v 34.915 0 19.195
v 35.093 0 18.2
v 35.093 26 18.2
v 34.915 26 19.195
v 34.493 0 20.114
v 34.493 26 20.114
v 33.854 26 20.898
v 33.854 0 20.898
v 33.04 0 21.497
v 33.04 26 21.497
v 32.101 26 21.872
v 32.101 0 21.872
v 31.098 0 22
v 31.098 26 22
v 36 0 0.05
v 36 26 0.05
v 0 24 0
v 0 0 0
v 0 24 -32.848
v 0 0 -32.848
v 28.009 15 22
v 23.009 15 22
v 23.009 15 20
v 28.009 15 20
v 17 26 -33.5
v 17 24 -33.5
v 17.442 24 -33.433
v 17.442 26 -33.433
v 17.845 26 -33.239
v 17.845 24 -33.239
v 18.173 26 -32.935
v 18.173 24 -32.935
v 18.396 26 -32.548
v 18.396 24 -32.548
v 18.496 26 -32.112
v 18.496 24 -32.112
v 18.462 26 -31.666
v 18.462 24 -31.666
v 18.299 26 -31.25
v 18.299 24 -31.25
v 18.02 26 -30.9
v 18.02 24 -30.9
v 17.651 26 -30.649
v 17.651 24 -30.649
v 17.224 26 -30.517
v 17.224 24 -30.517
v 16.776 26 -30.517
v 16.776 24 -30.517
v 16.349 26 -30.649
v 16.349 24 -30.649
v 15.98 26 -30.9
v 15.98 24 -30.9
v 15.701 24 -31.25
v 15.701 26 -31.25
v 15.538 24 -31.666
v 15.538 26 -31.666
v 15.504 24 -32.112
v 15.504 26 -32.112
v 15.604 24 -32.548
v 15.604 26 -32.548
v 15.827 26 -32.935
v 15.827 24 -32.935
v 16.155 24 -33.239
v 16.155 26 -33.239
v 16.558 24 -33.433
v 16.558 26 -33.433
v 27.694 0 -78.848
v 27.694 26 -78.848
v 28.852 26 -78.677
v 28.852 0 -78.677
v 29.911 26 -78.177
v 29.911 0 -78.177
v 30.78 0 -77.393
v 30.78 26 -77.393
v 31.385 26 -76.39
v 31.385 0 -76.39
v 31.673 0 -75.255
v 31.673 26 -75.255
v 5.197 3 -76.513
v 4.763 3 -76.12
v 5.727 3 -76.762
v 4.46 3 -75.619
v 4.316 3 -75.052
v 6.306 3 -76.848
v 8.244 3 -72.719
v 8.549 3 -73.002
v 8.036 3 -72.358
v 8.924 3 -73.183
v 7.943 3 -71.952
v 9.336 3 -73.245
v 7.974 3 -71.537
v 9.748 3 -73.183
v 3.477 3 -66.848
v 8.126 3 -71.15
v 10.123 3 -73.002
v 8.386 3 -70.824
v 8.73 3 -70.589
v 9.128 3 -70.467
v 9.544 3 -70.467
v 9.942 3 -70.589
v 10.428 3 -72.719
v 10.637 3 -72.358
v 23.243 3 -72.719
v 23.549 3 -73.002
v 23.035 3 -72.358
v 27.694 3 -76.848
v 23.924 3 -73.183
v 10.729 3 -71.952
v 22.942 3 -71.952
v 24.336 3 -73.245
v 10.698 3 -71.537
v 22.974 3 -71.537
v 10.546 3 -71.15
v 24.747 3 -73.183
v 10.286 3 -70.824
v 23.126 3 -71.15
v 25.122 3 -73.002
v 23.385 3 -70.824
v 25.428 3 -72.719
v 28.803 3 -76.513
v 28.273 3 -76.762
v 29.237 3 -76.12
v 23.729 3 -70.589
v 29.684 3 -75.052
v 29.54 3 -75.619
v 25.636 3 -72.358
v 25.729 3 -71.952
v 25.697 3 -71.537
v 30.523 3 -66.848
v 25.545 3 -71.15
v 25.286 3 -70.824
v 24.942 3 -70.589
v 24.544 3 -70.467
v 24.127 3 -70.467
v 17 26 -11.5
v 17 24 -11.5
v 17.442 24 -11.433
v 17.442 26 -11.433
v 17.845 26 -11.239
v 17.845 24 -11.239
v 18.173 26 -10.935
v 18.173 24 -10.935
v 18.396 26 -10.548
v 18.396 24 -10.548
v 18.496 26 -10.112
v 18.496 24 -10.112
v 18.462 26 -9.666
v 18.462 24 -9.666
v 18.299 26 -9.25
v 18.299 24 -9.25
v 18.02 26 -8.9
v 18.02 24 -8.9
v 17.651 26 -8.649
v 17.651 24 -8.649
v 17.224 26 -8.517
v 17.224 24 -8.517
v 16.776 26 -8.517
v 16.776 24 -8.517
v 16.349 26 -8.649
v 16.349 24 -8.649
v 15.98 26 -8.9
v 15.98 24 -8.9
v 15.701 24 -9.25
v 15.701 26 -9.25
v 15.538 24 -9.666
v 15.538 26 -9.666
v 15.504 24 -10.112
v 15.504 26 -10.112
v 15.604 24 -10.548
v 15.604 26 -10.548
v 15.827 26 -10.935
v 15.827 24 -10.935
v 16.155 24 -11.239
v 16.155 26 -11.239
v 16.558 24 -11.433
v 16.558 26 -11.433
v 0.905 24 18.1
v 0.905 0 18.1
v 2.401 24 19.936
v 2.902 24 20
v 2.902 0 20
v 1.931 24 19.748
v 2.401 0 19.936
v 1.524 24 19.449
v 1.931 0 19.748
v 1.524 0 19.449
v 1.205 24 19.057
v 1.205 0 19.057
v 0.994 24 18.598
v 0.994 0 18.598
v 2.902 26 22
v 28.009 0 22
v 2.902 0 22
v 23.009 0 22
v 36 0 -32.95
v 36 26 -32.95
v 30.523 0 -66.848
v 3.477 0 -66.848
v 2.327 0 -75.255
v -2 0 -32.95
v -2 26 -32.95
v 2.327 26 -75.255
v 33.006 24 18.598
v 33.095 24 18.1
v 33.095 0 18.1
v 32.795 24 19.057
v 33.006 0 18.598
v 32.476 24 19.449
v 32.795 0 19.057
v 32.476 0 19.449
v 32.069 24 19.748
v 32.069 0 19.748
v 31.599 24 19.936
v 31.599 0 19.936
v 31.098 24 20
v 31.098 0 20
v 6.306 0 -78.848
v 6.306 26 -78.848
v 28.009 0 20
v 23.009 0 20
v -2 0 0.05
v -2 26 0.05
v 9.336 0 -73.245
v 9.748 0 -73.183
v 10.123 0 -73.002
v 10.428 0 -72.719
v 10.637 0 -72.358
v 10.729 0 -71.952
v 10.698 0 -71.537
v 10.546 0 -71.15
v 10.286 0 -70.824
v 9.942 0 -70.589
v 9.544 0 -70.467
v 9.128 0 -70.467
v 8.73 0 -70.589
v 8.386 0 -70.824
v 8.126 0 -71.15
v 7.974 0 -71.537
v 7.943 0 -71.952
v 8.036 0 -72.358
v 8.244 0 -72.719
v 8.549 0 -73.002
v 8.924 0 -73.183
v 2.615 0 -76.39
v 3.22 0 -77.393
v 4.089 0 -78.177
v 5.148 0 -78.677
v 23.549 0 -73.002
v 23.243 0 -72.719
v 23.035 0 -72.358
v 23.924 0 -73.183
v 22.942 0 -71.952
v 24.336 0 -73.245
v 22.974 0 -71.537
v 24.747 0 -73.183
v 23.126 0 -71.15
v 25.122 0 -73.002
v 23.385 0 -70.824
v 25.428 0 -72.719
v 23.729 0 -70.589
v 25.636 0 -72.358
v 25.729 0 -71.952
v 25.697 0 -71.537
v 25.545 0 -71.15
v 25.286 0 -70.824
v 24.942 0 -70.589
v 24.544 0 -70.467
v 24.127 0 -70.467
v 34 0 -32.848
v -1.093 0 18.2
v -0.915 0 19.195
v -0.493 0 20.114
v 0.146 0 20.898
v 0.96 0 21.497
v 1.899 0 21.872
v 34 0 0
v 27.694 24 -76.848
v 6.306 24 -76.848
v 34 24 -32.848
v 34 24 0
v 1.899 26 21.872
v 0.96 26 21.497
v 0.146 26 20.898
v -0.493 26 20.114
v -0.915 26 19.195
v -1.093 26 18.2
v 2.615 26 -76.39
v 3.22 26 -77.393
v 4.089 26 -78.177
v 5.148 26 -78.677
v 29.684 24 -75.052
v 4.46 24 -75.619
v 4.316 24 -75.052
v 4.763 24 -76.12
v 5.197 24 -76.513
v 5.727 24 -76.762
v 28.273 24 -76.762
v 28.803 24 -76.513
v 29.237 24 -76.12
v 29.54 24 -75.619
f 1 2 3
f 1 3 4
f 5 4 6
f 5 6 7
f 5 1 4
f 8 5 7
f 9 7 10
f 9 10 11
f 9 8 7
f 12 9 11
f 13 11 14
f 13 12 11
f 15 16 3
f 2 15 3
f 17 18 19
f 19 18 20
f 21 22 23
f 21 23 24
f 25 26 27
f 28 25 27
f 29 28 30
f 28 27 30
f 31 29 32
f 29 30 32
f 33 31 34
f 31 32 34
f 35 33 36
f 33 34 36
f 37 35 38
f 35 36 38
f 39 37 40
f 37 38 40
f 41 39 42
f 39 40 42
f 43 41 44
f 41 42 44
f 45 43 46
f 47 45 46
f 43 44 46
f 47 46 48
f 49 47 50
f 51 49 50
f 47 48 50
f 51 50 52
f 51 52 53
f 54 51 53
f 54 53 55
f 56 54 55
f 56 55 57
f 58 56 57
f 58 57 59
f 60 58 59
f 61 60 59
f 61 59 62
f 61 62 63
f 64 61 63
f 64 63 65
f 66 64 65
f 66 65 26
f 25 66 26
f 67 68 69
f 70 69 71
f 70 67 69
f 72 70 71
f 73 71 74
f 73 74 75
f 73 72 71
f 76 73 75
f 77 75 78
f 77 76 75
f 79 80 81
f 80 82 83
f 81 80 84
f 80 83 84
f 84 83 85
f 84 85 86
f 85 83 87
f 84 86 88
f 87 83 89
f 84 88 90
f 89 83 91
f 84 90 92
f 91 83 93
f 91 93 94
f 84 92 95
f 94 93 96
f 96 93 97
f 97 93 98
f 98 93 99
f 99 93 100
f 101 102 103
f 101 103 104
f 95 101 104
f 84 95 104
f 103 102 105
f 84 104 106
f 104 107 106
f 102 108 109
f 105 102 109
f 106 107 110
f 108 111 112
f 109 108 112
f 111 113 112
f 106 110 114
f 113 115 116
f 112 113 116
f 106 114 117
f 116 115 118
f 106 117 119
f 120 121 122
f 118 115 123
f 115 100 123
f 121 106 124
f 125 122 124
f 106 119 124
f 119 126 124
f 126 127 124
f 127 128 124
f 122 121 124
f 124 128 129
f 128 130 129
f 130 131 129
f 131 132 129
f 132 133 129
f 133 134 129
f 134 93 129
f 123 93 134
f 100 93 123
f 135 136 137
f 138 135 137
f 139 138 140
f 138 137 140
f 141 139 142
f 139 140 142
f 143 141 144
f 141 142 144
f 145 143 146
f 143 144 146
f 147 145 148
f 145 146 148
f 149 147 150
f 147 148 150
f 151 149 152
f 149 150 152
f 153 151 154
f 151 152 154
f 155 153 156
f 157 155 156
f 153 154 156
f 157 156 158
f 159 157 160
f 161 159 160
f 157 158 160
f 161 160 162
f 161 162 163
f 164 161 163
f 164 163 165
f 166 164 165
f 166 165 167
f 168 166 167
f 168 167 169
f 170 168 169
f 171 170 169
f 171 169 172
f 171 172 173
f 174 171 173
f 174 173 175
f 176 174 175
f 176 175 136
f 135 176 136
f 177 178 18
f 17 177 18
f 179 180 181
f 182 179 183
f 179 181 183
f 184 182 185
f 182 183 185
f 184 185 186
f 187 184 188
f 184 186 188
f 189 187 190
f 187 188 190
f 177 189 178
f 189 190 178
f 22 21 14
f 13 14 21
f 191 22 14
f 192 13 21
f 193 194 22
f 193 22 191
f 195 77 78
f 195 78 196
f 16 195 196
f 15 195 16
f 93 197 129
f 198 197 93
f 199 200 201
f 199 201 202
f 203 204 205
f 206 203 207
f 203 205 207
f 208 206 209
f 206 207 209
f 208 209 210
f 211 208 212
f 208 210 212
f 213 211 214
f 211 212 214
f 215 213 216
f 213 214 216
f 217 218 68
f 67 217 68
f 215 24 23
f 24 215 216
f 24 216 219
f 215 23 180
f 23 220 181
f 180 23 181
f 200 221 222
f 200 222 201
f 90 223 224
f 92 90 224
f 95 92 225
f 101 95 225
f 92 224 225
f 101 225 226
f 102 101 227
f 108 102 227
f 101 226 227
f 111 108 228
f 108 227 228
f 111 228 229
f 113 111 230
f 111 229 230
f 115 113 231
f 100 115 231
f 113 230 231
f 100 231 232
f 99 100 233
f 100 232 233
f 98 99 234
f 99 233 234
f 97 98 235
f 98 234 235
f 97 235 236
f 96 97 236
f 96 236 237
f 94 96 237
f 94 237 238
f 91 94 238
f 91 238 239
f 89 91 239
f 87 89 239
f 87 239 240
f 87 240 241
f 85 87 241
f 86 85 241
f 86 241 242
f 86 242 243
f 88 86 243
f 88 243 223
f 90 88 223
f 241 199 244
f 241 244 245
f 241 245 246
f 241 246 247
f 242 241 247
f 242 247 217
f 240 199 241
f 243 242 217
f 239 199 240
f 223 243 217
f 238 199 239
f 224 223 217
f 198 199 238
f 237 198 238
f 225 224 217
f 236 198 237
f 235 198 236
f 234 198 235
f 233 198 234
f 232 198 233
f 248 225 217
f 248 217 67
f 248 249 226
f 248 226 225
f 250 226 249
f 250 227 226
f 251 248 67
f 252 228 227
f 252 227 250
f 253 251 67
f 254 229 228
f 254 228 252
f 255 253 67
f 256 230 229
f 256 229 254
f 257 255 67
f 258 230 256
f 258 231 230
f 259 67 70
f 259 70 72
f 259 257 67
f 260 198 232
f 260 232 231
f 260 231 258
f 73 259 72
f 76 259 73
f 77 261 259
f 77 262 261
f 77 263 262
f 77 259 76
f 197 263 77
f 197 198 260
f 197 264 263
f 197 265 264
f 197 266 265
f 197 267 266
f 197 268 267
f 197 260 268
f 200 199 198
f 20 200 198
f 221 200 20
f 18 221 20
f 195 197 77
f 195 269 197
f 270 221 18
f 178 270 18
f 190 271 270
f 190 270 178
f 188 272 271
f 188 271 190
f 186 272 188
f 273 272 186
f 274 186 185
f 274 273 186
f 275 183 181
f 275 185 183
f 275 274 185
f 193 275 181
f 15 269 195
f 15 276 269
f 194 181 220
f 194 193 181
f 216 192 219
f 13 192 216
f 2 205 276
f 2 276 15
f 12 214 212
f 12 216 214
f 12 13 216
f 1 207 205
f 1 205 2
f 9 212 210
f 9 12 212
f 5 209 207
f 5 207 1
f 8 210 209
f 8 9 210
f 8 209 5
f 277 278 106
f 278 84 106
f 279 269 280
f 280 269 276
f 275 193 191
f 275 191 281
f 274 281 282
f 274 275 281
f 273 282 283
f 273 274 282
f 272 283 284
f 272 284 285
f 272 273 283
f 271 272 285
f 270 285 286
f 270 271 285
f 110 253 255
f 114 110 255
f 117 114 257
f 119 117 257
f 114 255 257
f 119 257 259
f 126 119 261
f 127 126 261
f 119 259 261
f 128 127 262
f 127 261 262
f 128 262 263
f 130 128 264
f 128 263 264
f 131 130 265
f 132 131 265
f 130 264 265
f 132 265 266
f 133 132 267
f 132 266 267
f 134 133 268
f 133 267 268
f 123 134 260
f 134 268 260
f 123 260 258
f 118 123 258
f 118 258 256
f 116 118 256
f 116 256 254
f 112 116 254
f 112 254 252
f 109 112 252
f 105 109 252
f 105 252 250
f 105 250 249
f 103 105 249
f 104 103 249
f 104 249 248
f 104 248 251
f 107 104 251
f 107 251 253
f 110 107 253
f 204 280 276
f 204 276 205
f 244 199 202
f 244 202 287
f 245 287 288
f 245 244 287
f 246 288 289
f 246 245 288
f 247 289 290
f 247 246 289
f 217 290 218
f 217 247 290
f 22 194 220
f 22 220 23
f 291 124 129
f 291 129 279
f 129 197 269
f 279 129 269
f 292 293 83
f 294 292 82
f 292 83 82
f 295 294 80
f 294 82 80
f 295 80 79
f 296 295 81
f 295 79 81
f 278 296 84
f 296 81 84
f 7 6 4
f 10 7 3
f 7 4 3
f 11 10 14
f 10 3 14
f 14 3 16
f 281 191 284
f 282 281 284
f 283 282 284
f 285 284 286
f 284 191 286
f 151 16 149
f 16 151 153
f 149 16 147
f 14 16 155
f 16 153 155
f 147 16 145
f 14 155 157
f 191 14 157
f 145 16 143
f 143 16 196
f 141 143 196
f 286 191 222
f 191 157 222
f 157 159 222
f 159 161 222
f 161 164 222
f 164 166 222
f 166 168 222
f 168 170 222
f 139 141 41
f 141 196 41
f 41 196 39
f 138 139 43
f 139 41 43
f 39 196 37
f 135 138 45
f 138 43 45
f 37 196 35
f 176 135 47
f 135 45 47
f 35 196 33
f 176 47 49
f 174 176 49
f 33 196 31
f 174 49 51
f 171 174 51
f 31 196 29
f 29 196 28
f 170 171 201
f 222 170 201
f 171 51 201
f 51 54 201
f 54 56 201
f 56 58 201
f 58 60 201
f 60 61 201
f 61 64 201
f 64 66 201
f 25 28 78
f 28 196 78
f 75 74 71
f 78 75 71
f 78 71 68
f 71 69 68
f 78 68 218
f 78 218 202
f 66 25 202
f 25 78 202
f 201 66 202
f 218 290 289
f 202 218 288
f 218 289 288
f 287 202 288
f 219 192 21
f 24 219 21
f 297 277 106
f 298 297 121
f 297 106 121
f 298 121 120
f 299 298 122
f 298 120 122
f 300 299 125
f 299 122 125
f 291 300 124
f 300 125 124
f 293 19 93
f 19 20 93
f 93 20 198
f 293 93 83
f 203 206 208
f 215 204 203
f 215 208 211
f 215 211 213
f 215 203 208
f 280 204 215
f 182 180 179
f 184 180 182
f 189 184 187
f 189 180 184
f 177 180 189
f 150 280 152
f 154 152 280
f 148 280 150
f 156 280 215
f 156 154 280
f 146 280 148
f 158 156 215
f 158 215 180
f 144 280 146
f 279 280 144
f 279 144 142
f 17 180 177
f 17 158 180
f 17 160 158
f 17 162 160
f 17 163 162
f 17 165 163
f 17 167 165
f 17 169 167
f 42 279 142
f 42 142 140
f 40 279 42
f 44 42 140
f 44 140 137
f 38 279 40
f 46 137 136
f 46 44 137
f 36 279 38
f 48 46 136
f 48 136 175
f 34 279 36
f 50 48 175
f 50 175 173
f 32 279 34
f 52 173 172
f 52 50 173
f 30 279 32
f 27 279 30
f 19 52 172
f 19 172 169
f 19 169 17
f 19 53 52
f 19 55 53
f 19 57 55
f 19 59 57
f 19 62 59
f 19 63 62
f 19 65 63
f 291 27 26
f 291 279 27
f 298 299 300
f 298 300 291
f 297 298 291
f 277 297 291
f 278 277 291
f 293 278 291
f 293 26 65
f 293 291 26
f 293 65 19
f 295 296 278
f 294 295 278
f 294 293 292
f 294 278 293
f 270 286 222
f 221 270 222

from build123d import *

# Parameters (mm, degrees)
BOSS_EXTRUDE1_DEPTH = 26
SHELL1_T            = -2
SKETCH3_W           = 5
SKETCH3_H           = 15
CUT_EXTRUDE1_DEPTH  = 5
SKETCH4_R           = 1.5
CUT_EXTRUDE2_DEPTH  = 10
BOSS_EXTRUDE2_DEPTH = 3
SKETCH7_R           = 1.397
CUT_EXTRUDE3_DEPTH  = 5
SKETCH8_R           = 1.397
CUT_EXTRUDE4_DEPTH  = 5


with BuildPart() as part:
    # Sketch1 → Boss-Extrude1 (new body)
    with BuildSketch(Plane(origin=(0, 0, 0), x_dir=(1, 0, 0), z_dir=(0, 1, 0))):
        with BuildLine():
            Line((6.305887047, 78.84802453), (27.694112953, 78.84802453))
            ThreePointArc((27.694112953, 78.84802453), (30.374796425, 77.816851929), (31.673356222, 75.254992592))
            Line((31.673356222, 75.254992592), (36, 32.950031211))
            Line((36, 32.950031211), (36, -0.049968789))
            Line((36, -0.049968789), (35.092510916, -18.199750468))
            ThreePointArc((35.092510916, -18.199750468), (33.854401824, -20.898189251), (31.097501561, -22))
            Line((31.097501561, -22), (2.902498439, -22))
            ThreePointArc((2.902498439, -22), (0.145598176, -20.898189251), (-1.092510916, -18.199750468))
            Line((-1.092510916, -18.199750468), (-2, -0.049968789))
            Line((-2, -0.049968789), (-2, 32.950031211))
            Line((-2, 32.950031211), (2.326643778, 75.254992592))
            ThreePointArc((2.326643778, 75.254992592), (3.625203575, 77.816851929), (6.305887047, 78.84802453))
        make_face()
    extrude(amount=BOSS_EXTRUDE1_DEPTH)

    # Shell1
    shell1_openings = [part.faces().sort_by_distance(p)[0] for p in [
        (17, 0, -26.610641327),
    ]]
    offset(amount=SHELL1_T, openings=shell1_openings, kind=Kind.INTERSECTION)

    # Sketch3 → Cut-Extrude1 (cut)
    with BuildSketch(Plane.XY.offset(22)):
        with Locations((25.508858148, 7.5)):
            Rectangle(SKETCH3_W, SKETCH3_H)
    extrude(amount=-CUT_EXTRUDE1_DEPTH, mode=Mode.SUBTRACT)

    # Sketch4 → Cut-Extrude2 (cut)
    with BuildSketch(Plane.XZ.offset(-24)):
        with Locations(Location((17, -10, 0), (0, 0, 270))):
            Circle(SKETCH4_R)
        with Locations(Location((17, -32, 0), (0, 0, 270))):
            Circle(SKETCH4_R)
    extrude(amount=-CUT_EXTRUDE2_DEPTH, mode=Mode.SUBTRACT)

    # Sketch5 → Boss-Extrude2 (add)
    with BuildSketch(Plane.XZ):
        with BuildLine():
            Line((30.522727273, -66.84802453), (3.477272727, -66.84802453))
            Line((3.477272727, -66.84802453), (4.316265412, -75.051508561))
            ThreePointArc((4.316265412, -75.051508561), (4.965545311, -76.332438229), (6.305887047, -76.84802453))
            Line((6.305887047, -76.84802453), (27.694112953, -76.84802453))
            ThreePointArc((27.694112953, -76.84802453), (29.034454689, -76.332438229), (29.683734588, -75.051508561))
            Line((29.683734588, -75.051508561), (30.522727273, -66.84802453))
        make_face()
    extrude(amount=-BOSS_EXTRUDE2_DEPTH)

    # Sketch7 → Cut-Extrude3 (cut)
    with BuildSketch(Plane.XZ):
        with Locations(Location((24.335511696, -71.84802453, 0), (0, 0, 270))):
            Circle(SKETCH7_R)
    extrude(amount=-CUT_EXTRUDE3_DEPTH, mode=Mode.SUBTRACT)

    # Sketch8 → Cut-Extrude4 (cut)
    with BuildSketch(Plane.XZ):
        with Locations(Location((9.336175071, -71.84802453, 0), (0, 0, 270))):
            Circle(SKETCH8_R)
    extrude(amount=-CUT_EXTRUDE4_DEPTH, mode=Mode.SUBTRACT)


solid = part.part
